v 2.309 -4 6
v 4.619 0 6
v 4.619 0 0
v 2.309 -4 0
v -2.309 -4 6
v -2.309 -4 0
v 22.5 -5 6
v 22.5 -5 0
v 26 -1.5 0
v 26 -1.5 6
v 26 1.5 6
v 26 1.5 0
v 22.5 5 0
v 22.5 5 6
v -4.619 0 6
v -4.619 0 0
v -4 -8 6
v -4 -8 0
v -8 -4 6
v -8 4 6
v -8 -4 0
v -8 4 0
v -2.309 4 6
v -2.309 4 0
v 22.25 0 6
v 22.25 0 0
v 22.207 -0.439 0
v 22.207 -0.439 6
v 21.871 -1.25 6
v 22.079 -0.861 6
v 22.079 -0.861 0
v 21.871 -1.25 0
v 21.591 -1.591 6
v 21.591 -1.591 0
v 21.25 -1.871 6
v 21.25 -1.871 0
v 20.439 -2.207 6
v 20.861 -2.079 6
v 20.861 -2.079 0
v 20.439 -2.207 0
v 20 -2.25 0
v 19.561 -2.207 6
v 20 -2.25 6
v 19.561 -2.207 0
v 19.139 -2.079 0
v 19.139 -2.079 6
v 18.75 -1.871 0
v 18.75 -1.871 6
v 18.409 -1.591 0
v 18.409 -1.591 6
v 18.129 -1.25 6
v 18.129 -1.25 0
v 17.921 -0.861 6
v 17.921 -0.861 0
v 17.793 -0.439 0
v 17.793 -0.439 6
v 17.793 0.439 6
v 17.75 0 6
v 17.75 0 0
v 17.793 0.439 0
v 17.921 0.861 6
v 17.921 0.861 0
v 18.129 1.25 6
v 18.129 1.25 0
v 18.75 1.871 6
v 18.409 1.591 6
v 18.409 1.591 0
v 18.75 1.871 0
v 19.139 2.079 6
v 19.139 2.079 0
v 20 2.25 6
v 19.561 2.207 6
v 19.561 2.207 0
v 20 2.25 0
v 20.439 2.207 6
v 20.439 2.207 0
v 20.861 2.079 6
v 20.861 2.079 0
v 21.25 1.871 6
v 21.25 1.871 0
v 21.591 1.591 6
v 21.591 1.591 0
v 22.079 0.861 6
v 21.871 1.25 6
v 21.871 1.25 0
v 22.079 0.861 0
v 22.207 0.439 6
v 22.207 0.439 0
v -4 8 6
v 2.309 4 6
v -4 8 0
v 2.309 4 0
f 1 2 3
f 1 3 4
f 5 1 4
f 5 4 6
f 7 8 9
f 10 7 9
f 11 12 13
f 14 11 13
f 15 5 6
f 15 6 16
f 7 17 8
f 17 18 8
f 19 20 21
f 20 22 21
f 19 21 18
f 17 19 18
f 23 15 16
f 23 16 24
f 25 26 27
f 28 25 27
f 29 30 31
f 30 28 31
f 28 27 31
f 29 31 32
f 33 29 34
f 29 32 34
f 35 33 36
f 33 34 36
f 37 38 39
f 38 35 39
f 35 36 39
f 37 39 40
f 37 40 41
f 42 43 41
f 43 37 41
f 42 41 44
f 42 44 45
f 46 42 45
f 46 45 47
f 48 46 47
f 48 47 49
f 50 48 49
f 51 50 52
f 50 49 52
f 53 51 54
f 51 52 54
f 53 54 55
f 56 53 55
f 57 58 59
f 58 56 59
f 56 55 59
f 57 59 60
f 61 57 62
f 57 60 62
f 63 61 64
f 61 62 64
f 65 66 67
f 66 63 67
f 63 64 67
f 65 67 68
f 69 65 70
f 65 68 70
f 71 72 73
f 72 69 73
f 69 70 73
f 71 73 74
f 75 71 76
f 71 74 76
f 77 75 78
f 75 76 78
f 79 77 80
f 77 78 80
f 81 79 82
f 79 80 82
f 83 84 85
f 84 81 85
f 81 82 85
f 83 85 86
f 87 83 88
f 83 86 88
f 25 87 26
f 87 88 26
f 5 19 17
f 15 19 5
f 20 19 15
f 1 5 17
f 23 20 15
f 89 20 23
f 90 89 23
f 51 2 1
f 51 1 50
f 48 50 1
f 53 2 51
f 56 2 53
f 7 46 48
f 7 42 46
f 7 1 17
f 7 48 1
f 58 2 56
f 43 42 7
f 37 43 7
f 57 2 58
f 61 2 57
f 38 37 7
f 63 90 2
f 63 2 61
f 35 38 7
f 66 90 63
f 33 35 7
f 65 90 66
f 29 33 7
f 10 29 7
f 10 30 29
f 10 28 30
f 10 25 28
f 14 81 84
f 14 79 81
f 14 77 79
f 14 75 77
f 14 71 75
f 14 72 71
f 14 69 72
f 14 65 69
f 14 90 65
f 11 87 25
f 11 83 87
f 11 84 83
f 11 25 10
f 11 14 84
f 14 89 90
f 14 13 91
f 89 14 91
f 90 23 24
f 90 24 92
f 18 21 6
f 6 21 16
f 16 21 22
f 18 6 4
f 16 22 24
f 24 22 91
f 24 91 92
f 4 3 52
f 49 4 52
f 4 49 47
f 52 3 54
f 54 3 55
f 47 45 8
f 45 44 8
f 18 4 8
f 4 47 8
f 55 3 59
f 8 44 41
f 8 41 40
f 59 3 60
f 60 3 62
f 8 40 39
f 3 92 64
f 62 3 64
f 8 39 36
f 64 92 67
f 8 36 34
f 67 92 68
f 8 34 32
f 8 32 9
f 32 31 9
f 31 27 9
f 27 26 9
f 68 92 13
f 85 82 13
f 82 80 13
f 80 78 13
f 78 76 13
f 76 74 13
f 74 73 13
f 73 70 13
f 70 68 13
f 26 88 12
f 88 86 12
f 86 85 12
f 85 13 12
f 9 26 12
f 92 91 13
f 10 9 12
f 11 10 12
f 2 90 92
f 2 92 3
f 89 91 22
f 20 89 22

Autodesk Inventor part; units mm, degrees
ref_plane "YZ Plane" through (0, 0, 0) normal (1, 0, 0) x (0, 1, 0)
ref_plane "XZ Plane" through (0, 0, 0) normal (0, 1, 0) x (-1, 0, 0)
ref_plane "XY Plane" through (0, 0, 0) normal (0, 0, 1) x (1, 0, 0)
sketch "Sketch1" plane through (0, 0, 0) normal (0, 0, 1) x (1, 0, 0)
  line L0 (-4, -8) -> (22.5, -5)
  line L1 (26, -1.5) -> (26, 1.5)
  line L2 (22.5, 5) -> (-4, 8)
  line L3 (-8, 4) -> (-8, -4)
  line L4 (-4, 8) -> (-8, 4)
  line L5 (-8, -4) -> (-4, -8)
  line L6 (22.5, -5) -> (26, -1.5)
  line L7 (26, 1.5) -> (22.5, 5)
  circle A0 centre (0, 0) radius 2.75
  circle A1 centre (20, 0) radius 2.25
  circle A2 centre (0, 0) radius 5 construction
  circle A3 centre (20, 0) radius 4.5 construction
  point P0 (-8, 0)
  point P1 (26, 0)
  dimension "d9" = 8
  dimension "d10" = 20
  dimension "d11" = 4.5
  dimension "d12" = 5.5
  dimension "d13" = 6
  dimension "d16" = 10
  dimension "d17" = 9
  dimension "d18" = 8
  dimension "d19" = 4
  dimension "d20" = 4
  dimension "d21" = 4
  dimension "d22" = 10
  dimension "d23" = 3
extrude "Extrusion1" add sketch "Sketch1" along normal blind 6
sketch "Sketch2" plane through (0, 0, 6) normal (0, 0, 1) x (1, 0, 0)
  circle A0 centre (0, 0) radius 2.75 projected
  line L0 (-8, 4) -> (-8, -4) projected
  line L1 (4.6188, 0) -> (2.3094, -4)
  line L2 (2.3094, -4) -> (-2.3094, -4)
  line L3 (-2.3094, -4) -> (-4.6188, 0)
  line L4 (-4.6188, 0) -> (-2.3094, 4)
  line L5 (-2.3094, 4) -> (2.3094, 4)
  line L6 (2.3094, 4) -> (4.6188, 0)
  dimension "d24" = 8
extrude "Extrusion2" cut sketch "Sketch2" against normal through all
properties part number "y_carriage_nut_holder_b"
